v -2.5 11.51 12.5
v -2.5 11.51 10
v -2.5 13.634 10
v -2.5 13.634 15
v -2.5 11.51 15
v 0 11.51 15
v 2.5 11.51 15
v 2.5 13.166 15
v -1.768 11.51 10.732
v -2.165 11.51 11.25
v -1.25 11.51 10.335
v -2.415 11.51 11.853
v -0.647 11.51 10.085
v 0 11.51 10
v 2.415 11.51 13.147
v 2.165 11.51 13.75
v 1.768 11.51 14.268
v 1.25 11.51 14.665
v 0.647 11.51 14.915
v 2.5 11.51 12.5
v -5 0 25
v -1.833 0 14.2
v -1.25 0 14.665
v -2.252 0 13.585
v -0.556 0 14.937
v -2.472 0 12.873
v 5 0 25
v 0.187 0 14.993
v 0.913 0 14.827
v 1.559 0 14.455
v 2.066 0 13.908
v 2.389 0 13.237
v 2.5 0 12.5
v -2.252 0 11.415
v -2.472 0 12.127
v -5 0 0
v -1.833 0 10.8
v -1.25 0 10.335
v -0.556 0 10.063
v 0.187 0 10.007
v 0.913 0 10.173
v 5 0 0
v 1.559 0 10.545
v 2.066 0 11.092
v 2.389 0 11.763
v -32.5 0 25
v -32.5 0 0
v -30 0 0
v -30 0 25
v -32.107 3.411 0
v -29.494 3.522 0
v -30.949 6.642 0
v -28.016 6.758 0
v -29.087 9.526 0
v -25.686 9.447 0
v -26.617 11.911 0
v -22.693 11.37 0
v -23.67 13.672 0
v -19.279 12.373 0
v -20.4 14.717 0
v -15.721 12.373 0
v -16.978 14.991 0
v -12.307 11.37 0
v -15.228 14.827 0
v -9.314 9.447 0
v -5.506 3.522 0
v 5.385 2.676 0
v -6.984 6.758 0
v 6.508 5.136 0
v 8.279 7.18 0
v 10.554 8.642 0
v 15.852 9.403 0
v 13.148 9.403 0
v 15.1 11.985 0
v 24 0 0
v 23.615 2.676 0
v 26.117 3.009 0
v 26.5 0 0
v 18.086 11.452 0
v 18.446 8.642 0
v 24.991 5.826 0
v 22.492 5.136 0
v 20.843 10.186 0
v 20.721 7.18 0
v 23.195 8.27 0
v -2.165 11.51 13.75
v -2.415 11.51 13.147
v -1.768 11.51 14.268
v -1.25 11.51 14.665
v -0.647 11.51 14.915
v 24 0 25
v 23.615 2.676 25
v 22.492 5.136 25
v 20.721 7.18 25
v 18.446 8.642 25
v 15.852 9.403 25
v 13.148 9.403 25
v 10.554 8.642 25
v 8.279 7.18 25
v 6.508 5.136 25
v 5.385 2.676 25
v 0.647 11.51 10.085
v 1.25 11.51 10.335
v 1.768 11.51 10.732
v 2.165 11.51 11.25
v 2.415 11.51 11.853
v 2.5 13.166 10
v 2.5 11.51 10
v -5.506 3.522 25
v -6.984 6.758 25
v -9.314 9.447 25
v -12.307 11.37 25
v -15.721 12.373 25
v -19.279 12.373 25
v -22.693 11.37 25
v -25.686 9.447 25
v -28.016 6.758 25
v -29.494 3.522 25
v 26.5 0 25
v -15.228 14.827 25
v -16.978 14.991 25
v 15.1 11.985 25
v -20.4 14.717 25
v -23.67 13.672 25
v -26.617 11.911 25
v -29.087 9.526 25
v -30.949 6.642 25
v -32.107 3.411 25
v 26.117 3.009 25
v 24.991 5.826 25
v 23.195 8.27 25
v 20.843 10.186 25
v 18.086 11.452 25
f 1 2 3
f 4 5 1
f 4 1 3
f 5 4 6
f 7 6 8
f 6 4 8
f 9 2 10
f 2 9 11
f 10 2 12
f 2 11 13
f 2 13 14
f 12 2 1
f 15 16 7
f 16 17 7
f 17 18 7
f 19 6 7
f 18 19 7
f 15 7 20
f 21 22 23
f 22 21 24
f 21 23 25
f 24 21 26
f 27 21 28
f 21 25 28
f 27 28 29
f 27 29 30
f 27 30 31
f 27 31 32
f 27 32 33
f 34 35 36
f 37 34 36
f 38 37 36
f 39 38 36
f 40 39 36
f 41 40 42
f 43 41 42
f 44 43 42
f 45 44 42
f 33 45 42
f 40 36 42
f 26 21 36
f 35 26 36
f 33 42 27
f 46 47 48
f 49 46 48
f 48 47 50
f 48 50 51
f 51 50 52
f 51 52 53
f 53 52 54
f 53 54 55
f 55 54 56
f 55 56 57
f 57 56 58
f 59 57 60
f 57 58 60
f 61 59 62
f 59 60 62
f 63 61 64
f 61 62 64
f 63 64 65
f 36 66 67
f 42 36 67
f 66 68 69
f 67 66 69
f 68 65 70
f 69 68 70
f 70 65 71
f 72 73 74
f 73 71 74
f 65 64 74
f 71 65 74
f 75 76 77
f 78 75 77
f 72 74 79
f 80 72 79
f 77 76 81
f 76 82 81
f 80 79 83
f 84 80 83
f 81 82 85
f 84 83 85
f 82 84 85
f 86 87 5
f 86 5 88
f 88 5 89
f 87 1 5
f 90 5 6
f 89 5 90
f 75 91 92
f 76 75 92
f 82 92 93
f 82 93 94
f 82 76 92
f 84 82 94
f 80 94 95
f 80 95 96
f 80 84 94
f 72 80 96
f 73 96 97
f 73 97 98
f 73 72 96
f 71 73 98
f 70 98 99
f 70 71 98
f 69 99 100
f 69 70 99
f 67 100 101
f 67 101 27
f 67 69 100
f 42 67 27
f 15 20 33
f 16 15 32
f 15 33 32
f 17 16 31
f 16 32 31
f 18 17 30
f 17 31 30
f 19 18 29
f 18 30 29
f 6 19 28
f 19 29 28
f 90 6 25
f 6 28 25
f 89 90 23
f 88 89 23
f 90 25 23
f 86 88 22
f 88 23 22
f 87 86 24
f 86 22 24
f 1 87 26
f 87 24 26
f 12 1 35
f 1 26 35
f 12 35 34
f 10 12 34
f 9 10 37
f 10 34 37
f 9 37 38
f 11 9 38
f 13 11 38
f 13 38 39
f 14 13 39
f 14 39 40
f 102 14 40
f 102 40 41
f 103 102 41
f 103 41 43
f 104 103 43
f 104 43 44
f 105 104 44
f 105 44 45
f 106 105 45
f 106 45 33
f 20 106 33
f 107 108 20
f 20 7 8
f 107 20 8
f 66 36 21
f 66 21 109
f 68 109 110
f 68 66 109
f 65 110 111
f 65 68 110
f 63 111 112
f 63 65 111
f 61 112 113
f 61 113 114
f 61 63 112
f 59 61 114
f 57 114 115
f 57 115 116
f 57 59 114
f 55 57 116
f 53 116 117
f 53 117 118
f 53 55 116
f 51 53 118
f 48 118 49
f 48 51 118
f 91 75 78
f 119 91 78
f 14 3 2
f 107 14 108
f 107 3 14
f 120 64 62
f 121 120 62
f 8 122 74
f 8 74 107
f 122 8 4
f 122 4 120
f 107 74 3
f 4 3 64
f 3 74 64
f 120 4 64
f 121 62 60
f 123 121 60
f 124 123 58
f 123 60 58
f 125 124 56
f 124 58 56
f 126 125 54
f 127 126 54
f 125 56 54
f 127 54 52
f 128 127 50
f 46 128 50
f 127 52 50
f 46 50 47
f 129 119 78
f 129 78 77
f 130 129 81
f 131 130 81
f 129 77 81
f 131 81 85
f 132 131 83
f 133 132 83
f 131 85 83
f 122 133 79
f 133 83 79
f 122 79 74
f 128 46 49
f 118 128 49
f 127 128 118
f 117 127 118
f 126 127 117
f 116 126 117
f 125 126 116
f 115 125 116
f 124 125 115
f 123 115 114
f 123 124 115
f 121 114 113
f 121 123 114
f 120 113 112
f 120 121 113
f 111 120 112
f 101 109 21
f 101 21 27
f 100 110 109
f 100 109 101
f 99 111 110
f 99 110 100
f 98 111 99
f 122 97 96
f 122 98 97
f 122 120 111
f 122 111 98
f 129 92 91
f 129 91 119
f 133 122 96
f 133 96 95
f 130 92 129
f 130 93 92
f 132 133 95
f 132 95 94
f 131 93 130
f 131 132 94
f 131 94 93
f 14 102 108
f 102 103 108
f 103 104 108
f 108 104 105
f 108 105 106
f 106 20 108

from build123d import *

# Parameters (mm, degrees)
F0_R     = 12.5
F0_R_2   = 9.5
F1_DEPTH = 25
F2_W     = 68.8422210515
F2_H     = 15.526487492
F3_DEPTH = 25
F4_R     = 2.5
F5_DEPTH = 25
F7_W     = 5
F7_H     = 2.4230774548
F8_DEPTH = 2.5


with BuildPart() as f1:
    # F0 (on Top) → F1 (new body)
    with BuildSketch(Plane.XY):
        with BuildLine():
            Line((15.0999815878, 11.984991535), (-15.2279593776, 14.8269292644))
            Line((-15.2279593776, 14.8269292644), (-16.977902849, 14.9909110652))
            ThreePointArc((-16.977902849, 14.9909110652), (-32.4928088986, 0.4644150411), (-17.9067260562, -14.9944847833))
            Line((-17.9067260562, -14.9944847833), (-14.3728174755, -14.6704031798))
            Line((-14.3728174755, -14.6704031798), (14.7825476215, -11.9966731572))
            ThreePointArc((14.7825476215, -11.9966731572), (26.4989489041, -0.1588244182), (15.0999815878, 11.984991535))
        make_face()
        with Locations((-17.5, 0)):
            Circle(F0_R, mode=Mode.SUBTRACT)
        with Locations((14.5, 0)):
            Circle(F0_R_2, mode=Mode.SUBTRACT)
    extrude(amount=F1_DEPTH)

    # F2 (on Top) → F3 (cut)
    with BuildSketch(Plane.XY):
        with Locations((-1.8204059452, -7.763243746)):
            Rectangle(F2_W, F2_H)
    extrude(amount=F3_DEPTH, mode=Mode.SUBTRACT)

    # F4 (on face) → F5 (cut)
    with BuildSketch(Plane.XZ):
        with Locations((0, 12.5)):
            Circle(F4_R)
    extrude(amount=-F5_DEPTH, mode=Mode.SUBTRACT)

    # F7 (on offset) → F8 (cut, symmetric)
    with BuildSketch(Plane.XY.offset(12.5)):
        with Locations((0, 12.7214035019)):
            Rectangle(F7_W, F7_H)
    extrude(amount=F8_DEPTH, both=True, mode=Mode.SUBTRACT)


solid = f1.part
